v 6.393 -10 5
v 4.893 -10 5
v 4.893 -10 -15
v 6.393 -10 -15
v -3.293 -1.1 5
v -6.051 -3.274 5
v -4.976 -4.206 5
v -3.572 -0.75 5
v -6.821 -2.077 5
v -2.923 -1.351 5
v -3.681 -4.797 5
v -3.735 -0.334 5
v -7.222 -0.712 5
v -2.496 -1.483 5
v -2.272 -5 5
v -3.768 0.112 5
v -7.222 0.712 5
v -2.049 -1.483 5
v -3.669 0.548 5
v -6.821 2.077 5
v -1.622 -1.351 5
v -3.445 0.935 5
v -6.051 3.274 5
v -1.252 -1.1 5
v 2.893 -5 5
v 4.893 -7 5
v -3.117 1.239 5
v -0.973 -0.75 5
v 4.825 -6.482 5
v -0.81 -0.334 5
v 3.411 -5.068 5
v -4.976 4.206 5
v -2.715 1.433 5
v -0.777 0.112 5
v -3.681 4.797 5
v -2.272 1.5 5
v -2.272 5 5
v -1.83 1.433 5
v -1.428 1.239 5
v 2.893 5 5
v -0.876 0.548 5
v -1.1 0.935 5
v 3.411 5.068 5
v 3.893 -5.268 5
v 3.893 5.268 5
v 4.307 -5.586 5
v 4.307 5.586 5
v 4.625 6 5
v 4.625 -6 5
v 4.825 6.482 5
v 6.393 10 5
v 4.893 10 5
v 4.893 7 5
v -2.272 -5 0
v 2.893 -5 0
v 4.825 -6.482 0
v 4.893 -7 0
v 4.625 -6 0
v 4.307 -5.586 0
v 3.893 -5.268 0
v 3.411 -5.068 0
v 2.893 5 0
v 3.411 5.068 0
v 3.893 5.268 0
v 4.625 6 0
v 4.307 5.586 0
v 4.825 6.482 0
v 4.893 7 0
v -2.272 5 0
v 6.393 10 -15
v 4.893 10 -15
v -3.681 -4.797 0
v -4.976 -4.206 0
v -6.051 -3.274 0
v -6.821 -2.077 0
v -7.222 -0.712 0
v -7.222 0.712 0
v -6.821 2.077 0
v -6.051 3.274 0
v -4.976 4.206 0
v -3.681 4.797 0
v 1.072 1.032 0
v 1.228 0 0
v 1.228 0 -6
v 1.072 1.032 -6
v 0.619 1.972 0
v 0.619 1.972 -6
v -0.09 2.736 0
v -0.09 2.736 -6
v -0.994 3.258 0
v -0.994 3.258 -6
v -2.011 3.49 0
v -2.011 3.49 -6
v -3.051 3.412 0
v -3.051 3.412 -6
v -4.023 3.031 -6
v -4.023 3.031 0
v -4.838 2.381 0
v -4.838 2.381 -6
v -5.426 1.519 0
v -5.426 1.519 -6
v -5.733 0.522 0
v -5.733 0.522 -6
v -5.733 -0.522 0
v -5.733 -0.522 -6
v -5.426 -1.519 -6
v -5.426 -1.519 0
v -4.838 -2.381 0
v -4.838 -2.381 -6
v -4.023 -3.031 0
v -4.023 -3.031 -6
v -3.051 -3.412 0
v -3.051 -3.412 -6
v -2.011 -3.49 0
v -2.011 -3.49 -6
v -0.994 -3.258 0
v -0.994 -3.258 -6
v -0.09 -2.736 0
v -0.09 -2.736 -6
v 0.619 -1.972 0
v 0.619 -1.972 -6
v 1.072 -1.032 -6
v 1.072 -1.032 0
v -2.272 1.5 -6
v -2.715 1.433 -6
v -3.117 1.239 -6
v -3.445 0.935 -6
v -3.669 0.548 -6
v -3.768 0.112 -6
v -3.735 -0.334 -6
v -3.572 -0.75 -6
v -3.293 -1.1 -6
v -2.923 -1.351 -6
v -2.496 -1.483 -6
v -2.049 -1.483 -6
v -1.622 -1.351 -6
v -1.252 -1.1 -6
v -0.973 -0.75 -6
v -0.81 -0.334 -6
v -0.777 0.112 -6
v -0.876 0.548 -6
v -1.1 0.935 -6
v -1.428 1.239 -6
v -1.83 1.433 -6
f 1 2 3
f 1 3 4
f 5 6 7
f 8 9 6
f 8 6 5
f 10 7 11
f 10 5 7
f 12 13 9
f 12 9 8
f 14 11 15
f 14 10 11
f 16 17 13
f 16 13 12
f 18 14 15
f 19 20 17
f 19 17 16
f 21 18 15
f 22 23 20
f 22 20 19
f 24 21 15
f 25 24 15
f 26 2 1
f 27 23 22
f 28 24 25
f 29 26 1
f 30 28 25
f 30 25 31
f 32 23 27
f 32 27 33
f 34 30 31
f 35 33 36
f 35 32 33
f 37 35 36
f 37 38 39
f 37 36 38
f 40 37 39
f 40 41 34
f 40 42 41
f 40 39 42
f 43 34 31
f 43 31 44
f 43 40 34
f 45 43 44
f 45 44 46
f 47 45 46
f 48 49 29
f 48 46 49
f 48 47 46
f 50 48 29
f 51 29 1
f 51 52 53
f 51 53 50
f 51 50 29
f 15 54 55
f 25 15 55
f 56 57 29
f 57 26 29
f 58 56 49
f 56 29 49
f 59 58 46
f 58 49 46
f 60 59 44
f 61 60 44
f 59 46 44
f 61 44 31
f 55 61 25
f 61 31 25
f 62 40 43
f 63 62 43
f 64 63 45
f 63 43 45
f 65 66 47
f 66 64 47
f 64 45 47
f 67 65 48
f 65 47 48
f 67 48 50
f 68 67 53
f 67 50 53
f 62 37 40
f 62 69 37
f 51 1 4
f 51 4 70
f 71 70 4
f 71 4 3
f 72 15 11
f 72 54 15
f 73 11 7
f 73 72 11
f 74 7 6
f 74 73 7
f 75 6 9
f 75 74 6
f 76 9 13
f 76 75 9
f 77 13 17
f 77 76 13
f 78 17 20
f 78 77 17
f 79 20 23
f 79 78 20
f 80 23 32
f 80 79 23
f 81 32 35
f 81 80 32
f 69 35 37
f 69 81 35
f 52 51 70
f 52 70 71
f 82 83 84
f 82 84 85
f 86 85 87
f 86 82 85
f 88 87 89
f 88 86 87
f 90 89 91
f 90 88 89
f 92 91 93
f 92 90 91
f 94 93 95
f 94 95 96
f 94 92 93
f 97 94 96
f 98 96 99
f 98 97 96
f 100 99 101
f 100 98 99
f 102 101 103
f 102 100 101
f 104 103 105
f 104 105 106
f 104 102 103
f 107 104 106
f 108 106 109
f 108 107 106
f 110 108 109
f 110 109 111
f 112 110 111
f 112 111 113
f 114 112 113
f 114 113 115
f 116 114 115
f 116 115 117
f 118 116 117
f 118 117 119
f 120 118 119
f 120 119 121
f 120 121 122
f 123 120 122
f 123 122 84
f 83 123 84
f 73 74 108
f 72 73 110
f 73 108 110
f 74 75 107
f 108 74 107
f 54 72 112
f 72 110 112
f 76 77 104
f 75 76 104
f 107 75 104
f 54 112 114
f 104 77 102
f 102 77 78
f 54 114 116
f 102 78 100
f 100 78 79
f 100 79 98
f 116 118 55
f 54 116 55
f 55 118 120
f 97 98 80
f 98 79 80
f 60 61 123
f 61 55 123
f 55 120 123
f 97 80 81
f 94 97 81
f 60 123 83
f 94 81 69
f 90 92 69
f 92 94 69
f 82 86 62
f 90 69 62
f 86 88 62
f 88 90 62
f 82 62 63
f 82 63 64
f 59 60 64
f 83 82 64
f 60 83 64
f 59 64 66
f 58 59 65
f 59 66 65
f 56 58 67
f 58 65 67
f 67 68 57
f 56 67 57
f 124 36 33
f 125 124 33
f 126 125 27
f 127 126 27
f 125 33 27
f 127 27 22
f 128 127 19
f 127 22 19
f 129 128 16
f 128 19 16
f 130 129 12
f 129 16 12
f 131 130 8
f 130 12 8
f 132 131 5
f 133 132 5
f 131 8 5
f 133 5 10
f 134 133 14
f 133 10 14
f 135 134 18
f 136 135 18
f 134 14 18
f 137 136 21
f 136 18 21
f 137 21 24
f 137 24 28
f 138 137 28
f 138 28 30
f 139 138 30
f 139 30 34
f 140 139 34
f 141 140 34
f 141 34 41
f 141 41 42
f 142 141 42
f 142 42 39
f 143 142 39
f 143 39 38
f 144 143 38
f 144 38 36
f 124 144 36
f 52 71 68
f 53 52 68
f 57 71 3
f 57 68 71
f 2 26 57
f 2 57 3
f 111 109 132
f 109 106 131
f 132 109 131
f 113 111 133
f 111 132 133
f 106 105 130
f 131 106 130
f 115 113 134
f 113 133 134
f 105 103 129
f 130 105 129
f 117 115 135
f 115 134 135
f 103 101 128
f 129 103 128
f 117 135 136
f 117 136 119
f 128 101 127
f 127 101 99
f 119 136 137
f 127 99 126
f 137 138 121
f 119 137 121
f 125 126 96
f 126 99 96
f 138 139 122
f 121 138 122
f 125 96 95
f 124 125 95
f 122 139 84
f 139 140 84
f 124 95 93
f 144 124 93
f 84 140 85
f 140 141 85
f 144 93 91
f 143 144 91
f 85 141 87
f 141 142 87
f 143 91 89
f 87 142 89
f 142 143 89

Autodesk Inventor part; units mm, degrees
ref_plane "YZ Plane" through (0, 0, 0) normal (1, 0, 0) x (0, 1, 0)
ref_plane "XZ Plane" through (0, 0, 0) normal (0, 1, 0) x (-1, 0, 0)
ref_plane "XY Plane" through (0, 0, 0) normal (0, 0, 1) x (1, 0, 0)
sketch "Sketch1" plane through (0, 0, 0) normal (0, 0, 1) x (1, 0, 0)
  circle A0 centre (-2.2725, 0) radius 4 projected
  circle A1 centre (-2.2725, 0) radius 3.5
  point P0 (0, 0)
  dimension "d0" = 0.5
extrude "Extrusion1" add sketch "Sketch1" against normal blind 6 contours A1
sketch "Sketch2" plane through (-2.2725, 0, 0) normal (0, 0, 1) x (1, 0, 0)
  circle A0 centre (0, 0) radius 3.5 projected
  arc A1 (0, 5) -> (0, -5) centre (0, 0) ccw
  line L0 (0, 5) -> (7.1657, 5)
  line L1 (0, -5) -> (7.1657, -5)
  line L2 (8.6657, 10) -> (7.1657, 10)
  line L3 (7.1657, -10) -> (8.6657, -10)
  line L4 (8.6657, -10) -> (8.6657, 10)
  line L5 (7.1657, 10) -> (7.1657, 5)
  line L6 (7.1657, -5) -> (7.1657, -10)
  point P0 (2.2725, 0)
  dimension "d3" = 10
  dimension "d5" = 20
  dimension "d6" = 5
  dimension "d7" = 5
  dimension "d8" = 1.5
  dimension "d11" = 1.5
extrude "Extrusion2" add sketch "Sketch2" along normal blind 5 contours A0 | L0 L5 L2 L4 L3 L6 L1 A1
sketch "Sketch3" plane through (-2.2725, 0, 0) normal (0, 0, -1) x (-1, 0, 0)
  arc A0 (0, -5) -> (0, 5) centre (0, 0) ccw projected
  line L0 (-7.1657, 5) -> (0, 5) projected
  line L1 (-7.1657, 10) -> (-7.1657, 5) projected
  line L2 (-8.6657, 10) -> (-7.1657, 10) projected
  line L3 (-8.6657, -10) -> (-8.6657, 10) projected
  line L4 (-7.1657, -10) -> (-8.6657, -10) projected
  line L5 (-7.1657, -5) -> (-7.1657, -10) projected
  line L6 (0, -5) -> (-7.1657, -5) projected
  circle A1 centre (0, 0) radius 3.5 projected
  line L7 (-7.1657, -5) -> (-7.1657, -10) projected
  line L8 (-7.1657, -5) -> (-7.1657, 5)
  point P0 (-2.2725, 0)
extrude "Extrusion3" add sketch "Sketch3" along normal blind 15 contours L5 L4 L3 L2 L1 L8
fillet "Fillet1" radius 2 2 edges at (4.8932, 5, 2.5) (4.8932, -5, 2.5)
sketch "Sketch4" plane through (-2.2725, 0, -6) normal (0, 0, -1) x (-1, 0, 0)
  circle A0 centre (0, 0) radius 3.5 projected
  point P0 (-2.2725, 0)
hole "Hole1" at (-2.2725, 0, -6) direction (0, 0, 1) diameter 3 end through all
equation "\"d7\" = d6"
equation "\"d11\" = d8"
properties part number "center_holder_boat"
